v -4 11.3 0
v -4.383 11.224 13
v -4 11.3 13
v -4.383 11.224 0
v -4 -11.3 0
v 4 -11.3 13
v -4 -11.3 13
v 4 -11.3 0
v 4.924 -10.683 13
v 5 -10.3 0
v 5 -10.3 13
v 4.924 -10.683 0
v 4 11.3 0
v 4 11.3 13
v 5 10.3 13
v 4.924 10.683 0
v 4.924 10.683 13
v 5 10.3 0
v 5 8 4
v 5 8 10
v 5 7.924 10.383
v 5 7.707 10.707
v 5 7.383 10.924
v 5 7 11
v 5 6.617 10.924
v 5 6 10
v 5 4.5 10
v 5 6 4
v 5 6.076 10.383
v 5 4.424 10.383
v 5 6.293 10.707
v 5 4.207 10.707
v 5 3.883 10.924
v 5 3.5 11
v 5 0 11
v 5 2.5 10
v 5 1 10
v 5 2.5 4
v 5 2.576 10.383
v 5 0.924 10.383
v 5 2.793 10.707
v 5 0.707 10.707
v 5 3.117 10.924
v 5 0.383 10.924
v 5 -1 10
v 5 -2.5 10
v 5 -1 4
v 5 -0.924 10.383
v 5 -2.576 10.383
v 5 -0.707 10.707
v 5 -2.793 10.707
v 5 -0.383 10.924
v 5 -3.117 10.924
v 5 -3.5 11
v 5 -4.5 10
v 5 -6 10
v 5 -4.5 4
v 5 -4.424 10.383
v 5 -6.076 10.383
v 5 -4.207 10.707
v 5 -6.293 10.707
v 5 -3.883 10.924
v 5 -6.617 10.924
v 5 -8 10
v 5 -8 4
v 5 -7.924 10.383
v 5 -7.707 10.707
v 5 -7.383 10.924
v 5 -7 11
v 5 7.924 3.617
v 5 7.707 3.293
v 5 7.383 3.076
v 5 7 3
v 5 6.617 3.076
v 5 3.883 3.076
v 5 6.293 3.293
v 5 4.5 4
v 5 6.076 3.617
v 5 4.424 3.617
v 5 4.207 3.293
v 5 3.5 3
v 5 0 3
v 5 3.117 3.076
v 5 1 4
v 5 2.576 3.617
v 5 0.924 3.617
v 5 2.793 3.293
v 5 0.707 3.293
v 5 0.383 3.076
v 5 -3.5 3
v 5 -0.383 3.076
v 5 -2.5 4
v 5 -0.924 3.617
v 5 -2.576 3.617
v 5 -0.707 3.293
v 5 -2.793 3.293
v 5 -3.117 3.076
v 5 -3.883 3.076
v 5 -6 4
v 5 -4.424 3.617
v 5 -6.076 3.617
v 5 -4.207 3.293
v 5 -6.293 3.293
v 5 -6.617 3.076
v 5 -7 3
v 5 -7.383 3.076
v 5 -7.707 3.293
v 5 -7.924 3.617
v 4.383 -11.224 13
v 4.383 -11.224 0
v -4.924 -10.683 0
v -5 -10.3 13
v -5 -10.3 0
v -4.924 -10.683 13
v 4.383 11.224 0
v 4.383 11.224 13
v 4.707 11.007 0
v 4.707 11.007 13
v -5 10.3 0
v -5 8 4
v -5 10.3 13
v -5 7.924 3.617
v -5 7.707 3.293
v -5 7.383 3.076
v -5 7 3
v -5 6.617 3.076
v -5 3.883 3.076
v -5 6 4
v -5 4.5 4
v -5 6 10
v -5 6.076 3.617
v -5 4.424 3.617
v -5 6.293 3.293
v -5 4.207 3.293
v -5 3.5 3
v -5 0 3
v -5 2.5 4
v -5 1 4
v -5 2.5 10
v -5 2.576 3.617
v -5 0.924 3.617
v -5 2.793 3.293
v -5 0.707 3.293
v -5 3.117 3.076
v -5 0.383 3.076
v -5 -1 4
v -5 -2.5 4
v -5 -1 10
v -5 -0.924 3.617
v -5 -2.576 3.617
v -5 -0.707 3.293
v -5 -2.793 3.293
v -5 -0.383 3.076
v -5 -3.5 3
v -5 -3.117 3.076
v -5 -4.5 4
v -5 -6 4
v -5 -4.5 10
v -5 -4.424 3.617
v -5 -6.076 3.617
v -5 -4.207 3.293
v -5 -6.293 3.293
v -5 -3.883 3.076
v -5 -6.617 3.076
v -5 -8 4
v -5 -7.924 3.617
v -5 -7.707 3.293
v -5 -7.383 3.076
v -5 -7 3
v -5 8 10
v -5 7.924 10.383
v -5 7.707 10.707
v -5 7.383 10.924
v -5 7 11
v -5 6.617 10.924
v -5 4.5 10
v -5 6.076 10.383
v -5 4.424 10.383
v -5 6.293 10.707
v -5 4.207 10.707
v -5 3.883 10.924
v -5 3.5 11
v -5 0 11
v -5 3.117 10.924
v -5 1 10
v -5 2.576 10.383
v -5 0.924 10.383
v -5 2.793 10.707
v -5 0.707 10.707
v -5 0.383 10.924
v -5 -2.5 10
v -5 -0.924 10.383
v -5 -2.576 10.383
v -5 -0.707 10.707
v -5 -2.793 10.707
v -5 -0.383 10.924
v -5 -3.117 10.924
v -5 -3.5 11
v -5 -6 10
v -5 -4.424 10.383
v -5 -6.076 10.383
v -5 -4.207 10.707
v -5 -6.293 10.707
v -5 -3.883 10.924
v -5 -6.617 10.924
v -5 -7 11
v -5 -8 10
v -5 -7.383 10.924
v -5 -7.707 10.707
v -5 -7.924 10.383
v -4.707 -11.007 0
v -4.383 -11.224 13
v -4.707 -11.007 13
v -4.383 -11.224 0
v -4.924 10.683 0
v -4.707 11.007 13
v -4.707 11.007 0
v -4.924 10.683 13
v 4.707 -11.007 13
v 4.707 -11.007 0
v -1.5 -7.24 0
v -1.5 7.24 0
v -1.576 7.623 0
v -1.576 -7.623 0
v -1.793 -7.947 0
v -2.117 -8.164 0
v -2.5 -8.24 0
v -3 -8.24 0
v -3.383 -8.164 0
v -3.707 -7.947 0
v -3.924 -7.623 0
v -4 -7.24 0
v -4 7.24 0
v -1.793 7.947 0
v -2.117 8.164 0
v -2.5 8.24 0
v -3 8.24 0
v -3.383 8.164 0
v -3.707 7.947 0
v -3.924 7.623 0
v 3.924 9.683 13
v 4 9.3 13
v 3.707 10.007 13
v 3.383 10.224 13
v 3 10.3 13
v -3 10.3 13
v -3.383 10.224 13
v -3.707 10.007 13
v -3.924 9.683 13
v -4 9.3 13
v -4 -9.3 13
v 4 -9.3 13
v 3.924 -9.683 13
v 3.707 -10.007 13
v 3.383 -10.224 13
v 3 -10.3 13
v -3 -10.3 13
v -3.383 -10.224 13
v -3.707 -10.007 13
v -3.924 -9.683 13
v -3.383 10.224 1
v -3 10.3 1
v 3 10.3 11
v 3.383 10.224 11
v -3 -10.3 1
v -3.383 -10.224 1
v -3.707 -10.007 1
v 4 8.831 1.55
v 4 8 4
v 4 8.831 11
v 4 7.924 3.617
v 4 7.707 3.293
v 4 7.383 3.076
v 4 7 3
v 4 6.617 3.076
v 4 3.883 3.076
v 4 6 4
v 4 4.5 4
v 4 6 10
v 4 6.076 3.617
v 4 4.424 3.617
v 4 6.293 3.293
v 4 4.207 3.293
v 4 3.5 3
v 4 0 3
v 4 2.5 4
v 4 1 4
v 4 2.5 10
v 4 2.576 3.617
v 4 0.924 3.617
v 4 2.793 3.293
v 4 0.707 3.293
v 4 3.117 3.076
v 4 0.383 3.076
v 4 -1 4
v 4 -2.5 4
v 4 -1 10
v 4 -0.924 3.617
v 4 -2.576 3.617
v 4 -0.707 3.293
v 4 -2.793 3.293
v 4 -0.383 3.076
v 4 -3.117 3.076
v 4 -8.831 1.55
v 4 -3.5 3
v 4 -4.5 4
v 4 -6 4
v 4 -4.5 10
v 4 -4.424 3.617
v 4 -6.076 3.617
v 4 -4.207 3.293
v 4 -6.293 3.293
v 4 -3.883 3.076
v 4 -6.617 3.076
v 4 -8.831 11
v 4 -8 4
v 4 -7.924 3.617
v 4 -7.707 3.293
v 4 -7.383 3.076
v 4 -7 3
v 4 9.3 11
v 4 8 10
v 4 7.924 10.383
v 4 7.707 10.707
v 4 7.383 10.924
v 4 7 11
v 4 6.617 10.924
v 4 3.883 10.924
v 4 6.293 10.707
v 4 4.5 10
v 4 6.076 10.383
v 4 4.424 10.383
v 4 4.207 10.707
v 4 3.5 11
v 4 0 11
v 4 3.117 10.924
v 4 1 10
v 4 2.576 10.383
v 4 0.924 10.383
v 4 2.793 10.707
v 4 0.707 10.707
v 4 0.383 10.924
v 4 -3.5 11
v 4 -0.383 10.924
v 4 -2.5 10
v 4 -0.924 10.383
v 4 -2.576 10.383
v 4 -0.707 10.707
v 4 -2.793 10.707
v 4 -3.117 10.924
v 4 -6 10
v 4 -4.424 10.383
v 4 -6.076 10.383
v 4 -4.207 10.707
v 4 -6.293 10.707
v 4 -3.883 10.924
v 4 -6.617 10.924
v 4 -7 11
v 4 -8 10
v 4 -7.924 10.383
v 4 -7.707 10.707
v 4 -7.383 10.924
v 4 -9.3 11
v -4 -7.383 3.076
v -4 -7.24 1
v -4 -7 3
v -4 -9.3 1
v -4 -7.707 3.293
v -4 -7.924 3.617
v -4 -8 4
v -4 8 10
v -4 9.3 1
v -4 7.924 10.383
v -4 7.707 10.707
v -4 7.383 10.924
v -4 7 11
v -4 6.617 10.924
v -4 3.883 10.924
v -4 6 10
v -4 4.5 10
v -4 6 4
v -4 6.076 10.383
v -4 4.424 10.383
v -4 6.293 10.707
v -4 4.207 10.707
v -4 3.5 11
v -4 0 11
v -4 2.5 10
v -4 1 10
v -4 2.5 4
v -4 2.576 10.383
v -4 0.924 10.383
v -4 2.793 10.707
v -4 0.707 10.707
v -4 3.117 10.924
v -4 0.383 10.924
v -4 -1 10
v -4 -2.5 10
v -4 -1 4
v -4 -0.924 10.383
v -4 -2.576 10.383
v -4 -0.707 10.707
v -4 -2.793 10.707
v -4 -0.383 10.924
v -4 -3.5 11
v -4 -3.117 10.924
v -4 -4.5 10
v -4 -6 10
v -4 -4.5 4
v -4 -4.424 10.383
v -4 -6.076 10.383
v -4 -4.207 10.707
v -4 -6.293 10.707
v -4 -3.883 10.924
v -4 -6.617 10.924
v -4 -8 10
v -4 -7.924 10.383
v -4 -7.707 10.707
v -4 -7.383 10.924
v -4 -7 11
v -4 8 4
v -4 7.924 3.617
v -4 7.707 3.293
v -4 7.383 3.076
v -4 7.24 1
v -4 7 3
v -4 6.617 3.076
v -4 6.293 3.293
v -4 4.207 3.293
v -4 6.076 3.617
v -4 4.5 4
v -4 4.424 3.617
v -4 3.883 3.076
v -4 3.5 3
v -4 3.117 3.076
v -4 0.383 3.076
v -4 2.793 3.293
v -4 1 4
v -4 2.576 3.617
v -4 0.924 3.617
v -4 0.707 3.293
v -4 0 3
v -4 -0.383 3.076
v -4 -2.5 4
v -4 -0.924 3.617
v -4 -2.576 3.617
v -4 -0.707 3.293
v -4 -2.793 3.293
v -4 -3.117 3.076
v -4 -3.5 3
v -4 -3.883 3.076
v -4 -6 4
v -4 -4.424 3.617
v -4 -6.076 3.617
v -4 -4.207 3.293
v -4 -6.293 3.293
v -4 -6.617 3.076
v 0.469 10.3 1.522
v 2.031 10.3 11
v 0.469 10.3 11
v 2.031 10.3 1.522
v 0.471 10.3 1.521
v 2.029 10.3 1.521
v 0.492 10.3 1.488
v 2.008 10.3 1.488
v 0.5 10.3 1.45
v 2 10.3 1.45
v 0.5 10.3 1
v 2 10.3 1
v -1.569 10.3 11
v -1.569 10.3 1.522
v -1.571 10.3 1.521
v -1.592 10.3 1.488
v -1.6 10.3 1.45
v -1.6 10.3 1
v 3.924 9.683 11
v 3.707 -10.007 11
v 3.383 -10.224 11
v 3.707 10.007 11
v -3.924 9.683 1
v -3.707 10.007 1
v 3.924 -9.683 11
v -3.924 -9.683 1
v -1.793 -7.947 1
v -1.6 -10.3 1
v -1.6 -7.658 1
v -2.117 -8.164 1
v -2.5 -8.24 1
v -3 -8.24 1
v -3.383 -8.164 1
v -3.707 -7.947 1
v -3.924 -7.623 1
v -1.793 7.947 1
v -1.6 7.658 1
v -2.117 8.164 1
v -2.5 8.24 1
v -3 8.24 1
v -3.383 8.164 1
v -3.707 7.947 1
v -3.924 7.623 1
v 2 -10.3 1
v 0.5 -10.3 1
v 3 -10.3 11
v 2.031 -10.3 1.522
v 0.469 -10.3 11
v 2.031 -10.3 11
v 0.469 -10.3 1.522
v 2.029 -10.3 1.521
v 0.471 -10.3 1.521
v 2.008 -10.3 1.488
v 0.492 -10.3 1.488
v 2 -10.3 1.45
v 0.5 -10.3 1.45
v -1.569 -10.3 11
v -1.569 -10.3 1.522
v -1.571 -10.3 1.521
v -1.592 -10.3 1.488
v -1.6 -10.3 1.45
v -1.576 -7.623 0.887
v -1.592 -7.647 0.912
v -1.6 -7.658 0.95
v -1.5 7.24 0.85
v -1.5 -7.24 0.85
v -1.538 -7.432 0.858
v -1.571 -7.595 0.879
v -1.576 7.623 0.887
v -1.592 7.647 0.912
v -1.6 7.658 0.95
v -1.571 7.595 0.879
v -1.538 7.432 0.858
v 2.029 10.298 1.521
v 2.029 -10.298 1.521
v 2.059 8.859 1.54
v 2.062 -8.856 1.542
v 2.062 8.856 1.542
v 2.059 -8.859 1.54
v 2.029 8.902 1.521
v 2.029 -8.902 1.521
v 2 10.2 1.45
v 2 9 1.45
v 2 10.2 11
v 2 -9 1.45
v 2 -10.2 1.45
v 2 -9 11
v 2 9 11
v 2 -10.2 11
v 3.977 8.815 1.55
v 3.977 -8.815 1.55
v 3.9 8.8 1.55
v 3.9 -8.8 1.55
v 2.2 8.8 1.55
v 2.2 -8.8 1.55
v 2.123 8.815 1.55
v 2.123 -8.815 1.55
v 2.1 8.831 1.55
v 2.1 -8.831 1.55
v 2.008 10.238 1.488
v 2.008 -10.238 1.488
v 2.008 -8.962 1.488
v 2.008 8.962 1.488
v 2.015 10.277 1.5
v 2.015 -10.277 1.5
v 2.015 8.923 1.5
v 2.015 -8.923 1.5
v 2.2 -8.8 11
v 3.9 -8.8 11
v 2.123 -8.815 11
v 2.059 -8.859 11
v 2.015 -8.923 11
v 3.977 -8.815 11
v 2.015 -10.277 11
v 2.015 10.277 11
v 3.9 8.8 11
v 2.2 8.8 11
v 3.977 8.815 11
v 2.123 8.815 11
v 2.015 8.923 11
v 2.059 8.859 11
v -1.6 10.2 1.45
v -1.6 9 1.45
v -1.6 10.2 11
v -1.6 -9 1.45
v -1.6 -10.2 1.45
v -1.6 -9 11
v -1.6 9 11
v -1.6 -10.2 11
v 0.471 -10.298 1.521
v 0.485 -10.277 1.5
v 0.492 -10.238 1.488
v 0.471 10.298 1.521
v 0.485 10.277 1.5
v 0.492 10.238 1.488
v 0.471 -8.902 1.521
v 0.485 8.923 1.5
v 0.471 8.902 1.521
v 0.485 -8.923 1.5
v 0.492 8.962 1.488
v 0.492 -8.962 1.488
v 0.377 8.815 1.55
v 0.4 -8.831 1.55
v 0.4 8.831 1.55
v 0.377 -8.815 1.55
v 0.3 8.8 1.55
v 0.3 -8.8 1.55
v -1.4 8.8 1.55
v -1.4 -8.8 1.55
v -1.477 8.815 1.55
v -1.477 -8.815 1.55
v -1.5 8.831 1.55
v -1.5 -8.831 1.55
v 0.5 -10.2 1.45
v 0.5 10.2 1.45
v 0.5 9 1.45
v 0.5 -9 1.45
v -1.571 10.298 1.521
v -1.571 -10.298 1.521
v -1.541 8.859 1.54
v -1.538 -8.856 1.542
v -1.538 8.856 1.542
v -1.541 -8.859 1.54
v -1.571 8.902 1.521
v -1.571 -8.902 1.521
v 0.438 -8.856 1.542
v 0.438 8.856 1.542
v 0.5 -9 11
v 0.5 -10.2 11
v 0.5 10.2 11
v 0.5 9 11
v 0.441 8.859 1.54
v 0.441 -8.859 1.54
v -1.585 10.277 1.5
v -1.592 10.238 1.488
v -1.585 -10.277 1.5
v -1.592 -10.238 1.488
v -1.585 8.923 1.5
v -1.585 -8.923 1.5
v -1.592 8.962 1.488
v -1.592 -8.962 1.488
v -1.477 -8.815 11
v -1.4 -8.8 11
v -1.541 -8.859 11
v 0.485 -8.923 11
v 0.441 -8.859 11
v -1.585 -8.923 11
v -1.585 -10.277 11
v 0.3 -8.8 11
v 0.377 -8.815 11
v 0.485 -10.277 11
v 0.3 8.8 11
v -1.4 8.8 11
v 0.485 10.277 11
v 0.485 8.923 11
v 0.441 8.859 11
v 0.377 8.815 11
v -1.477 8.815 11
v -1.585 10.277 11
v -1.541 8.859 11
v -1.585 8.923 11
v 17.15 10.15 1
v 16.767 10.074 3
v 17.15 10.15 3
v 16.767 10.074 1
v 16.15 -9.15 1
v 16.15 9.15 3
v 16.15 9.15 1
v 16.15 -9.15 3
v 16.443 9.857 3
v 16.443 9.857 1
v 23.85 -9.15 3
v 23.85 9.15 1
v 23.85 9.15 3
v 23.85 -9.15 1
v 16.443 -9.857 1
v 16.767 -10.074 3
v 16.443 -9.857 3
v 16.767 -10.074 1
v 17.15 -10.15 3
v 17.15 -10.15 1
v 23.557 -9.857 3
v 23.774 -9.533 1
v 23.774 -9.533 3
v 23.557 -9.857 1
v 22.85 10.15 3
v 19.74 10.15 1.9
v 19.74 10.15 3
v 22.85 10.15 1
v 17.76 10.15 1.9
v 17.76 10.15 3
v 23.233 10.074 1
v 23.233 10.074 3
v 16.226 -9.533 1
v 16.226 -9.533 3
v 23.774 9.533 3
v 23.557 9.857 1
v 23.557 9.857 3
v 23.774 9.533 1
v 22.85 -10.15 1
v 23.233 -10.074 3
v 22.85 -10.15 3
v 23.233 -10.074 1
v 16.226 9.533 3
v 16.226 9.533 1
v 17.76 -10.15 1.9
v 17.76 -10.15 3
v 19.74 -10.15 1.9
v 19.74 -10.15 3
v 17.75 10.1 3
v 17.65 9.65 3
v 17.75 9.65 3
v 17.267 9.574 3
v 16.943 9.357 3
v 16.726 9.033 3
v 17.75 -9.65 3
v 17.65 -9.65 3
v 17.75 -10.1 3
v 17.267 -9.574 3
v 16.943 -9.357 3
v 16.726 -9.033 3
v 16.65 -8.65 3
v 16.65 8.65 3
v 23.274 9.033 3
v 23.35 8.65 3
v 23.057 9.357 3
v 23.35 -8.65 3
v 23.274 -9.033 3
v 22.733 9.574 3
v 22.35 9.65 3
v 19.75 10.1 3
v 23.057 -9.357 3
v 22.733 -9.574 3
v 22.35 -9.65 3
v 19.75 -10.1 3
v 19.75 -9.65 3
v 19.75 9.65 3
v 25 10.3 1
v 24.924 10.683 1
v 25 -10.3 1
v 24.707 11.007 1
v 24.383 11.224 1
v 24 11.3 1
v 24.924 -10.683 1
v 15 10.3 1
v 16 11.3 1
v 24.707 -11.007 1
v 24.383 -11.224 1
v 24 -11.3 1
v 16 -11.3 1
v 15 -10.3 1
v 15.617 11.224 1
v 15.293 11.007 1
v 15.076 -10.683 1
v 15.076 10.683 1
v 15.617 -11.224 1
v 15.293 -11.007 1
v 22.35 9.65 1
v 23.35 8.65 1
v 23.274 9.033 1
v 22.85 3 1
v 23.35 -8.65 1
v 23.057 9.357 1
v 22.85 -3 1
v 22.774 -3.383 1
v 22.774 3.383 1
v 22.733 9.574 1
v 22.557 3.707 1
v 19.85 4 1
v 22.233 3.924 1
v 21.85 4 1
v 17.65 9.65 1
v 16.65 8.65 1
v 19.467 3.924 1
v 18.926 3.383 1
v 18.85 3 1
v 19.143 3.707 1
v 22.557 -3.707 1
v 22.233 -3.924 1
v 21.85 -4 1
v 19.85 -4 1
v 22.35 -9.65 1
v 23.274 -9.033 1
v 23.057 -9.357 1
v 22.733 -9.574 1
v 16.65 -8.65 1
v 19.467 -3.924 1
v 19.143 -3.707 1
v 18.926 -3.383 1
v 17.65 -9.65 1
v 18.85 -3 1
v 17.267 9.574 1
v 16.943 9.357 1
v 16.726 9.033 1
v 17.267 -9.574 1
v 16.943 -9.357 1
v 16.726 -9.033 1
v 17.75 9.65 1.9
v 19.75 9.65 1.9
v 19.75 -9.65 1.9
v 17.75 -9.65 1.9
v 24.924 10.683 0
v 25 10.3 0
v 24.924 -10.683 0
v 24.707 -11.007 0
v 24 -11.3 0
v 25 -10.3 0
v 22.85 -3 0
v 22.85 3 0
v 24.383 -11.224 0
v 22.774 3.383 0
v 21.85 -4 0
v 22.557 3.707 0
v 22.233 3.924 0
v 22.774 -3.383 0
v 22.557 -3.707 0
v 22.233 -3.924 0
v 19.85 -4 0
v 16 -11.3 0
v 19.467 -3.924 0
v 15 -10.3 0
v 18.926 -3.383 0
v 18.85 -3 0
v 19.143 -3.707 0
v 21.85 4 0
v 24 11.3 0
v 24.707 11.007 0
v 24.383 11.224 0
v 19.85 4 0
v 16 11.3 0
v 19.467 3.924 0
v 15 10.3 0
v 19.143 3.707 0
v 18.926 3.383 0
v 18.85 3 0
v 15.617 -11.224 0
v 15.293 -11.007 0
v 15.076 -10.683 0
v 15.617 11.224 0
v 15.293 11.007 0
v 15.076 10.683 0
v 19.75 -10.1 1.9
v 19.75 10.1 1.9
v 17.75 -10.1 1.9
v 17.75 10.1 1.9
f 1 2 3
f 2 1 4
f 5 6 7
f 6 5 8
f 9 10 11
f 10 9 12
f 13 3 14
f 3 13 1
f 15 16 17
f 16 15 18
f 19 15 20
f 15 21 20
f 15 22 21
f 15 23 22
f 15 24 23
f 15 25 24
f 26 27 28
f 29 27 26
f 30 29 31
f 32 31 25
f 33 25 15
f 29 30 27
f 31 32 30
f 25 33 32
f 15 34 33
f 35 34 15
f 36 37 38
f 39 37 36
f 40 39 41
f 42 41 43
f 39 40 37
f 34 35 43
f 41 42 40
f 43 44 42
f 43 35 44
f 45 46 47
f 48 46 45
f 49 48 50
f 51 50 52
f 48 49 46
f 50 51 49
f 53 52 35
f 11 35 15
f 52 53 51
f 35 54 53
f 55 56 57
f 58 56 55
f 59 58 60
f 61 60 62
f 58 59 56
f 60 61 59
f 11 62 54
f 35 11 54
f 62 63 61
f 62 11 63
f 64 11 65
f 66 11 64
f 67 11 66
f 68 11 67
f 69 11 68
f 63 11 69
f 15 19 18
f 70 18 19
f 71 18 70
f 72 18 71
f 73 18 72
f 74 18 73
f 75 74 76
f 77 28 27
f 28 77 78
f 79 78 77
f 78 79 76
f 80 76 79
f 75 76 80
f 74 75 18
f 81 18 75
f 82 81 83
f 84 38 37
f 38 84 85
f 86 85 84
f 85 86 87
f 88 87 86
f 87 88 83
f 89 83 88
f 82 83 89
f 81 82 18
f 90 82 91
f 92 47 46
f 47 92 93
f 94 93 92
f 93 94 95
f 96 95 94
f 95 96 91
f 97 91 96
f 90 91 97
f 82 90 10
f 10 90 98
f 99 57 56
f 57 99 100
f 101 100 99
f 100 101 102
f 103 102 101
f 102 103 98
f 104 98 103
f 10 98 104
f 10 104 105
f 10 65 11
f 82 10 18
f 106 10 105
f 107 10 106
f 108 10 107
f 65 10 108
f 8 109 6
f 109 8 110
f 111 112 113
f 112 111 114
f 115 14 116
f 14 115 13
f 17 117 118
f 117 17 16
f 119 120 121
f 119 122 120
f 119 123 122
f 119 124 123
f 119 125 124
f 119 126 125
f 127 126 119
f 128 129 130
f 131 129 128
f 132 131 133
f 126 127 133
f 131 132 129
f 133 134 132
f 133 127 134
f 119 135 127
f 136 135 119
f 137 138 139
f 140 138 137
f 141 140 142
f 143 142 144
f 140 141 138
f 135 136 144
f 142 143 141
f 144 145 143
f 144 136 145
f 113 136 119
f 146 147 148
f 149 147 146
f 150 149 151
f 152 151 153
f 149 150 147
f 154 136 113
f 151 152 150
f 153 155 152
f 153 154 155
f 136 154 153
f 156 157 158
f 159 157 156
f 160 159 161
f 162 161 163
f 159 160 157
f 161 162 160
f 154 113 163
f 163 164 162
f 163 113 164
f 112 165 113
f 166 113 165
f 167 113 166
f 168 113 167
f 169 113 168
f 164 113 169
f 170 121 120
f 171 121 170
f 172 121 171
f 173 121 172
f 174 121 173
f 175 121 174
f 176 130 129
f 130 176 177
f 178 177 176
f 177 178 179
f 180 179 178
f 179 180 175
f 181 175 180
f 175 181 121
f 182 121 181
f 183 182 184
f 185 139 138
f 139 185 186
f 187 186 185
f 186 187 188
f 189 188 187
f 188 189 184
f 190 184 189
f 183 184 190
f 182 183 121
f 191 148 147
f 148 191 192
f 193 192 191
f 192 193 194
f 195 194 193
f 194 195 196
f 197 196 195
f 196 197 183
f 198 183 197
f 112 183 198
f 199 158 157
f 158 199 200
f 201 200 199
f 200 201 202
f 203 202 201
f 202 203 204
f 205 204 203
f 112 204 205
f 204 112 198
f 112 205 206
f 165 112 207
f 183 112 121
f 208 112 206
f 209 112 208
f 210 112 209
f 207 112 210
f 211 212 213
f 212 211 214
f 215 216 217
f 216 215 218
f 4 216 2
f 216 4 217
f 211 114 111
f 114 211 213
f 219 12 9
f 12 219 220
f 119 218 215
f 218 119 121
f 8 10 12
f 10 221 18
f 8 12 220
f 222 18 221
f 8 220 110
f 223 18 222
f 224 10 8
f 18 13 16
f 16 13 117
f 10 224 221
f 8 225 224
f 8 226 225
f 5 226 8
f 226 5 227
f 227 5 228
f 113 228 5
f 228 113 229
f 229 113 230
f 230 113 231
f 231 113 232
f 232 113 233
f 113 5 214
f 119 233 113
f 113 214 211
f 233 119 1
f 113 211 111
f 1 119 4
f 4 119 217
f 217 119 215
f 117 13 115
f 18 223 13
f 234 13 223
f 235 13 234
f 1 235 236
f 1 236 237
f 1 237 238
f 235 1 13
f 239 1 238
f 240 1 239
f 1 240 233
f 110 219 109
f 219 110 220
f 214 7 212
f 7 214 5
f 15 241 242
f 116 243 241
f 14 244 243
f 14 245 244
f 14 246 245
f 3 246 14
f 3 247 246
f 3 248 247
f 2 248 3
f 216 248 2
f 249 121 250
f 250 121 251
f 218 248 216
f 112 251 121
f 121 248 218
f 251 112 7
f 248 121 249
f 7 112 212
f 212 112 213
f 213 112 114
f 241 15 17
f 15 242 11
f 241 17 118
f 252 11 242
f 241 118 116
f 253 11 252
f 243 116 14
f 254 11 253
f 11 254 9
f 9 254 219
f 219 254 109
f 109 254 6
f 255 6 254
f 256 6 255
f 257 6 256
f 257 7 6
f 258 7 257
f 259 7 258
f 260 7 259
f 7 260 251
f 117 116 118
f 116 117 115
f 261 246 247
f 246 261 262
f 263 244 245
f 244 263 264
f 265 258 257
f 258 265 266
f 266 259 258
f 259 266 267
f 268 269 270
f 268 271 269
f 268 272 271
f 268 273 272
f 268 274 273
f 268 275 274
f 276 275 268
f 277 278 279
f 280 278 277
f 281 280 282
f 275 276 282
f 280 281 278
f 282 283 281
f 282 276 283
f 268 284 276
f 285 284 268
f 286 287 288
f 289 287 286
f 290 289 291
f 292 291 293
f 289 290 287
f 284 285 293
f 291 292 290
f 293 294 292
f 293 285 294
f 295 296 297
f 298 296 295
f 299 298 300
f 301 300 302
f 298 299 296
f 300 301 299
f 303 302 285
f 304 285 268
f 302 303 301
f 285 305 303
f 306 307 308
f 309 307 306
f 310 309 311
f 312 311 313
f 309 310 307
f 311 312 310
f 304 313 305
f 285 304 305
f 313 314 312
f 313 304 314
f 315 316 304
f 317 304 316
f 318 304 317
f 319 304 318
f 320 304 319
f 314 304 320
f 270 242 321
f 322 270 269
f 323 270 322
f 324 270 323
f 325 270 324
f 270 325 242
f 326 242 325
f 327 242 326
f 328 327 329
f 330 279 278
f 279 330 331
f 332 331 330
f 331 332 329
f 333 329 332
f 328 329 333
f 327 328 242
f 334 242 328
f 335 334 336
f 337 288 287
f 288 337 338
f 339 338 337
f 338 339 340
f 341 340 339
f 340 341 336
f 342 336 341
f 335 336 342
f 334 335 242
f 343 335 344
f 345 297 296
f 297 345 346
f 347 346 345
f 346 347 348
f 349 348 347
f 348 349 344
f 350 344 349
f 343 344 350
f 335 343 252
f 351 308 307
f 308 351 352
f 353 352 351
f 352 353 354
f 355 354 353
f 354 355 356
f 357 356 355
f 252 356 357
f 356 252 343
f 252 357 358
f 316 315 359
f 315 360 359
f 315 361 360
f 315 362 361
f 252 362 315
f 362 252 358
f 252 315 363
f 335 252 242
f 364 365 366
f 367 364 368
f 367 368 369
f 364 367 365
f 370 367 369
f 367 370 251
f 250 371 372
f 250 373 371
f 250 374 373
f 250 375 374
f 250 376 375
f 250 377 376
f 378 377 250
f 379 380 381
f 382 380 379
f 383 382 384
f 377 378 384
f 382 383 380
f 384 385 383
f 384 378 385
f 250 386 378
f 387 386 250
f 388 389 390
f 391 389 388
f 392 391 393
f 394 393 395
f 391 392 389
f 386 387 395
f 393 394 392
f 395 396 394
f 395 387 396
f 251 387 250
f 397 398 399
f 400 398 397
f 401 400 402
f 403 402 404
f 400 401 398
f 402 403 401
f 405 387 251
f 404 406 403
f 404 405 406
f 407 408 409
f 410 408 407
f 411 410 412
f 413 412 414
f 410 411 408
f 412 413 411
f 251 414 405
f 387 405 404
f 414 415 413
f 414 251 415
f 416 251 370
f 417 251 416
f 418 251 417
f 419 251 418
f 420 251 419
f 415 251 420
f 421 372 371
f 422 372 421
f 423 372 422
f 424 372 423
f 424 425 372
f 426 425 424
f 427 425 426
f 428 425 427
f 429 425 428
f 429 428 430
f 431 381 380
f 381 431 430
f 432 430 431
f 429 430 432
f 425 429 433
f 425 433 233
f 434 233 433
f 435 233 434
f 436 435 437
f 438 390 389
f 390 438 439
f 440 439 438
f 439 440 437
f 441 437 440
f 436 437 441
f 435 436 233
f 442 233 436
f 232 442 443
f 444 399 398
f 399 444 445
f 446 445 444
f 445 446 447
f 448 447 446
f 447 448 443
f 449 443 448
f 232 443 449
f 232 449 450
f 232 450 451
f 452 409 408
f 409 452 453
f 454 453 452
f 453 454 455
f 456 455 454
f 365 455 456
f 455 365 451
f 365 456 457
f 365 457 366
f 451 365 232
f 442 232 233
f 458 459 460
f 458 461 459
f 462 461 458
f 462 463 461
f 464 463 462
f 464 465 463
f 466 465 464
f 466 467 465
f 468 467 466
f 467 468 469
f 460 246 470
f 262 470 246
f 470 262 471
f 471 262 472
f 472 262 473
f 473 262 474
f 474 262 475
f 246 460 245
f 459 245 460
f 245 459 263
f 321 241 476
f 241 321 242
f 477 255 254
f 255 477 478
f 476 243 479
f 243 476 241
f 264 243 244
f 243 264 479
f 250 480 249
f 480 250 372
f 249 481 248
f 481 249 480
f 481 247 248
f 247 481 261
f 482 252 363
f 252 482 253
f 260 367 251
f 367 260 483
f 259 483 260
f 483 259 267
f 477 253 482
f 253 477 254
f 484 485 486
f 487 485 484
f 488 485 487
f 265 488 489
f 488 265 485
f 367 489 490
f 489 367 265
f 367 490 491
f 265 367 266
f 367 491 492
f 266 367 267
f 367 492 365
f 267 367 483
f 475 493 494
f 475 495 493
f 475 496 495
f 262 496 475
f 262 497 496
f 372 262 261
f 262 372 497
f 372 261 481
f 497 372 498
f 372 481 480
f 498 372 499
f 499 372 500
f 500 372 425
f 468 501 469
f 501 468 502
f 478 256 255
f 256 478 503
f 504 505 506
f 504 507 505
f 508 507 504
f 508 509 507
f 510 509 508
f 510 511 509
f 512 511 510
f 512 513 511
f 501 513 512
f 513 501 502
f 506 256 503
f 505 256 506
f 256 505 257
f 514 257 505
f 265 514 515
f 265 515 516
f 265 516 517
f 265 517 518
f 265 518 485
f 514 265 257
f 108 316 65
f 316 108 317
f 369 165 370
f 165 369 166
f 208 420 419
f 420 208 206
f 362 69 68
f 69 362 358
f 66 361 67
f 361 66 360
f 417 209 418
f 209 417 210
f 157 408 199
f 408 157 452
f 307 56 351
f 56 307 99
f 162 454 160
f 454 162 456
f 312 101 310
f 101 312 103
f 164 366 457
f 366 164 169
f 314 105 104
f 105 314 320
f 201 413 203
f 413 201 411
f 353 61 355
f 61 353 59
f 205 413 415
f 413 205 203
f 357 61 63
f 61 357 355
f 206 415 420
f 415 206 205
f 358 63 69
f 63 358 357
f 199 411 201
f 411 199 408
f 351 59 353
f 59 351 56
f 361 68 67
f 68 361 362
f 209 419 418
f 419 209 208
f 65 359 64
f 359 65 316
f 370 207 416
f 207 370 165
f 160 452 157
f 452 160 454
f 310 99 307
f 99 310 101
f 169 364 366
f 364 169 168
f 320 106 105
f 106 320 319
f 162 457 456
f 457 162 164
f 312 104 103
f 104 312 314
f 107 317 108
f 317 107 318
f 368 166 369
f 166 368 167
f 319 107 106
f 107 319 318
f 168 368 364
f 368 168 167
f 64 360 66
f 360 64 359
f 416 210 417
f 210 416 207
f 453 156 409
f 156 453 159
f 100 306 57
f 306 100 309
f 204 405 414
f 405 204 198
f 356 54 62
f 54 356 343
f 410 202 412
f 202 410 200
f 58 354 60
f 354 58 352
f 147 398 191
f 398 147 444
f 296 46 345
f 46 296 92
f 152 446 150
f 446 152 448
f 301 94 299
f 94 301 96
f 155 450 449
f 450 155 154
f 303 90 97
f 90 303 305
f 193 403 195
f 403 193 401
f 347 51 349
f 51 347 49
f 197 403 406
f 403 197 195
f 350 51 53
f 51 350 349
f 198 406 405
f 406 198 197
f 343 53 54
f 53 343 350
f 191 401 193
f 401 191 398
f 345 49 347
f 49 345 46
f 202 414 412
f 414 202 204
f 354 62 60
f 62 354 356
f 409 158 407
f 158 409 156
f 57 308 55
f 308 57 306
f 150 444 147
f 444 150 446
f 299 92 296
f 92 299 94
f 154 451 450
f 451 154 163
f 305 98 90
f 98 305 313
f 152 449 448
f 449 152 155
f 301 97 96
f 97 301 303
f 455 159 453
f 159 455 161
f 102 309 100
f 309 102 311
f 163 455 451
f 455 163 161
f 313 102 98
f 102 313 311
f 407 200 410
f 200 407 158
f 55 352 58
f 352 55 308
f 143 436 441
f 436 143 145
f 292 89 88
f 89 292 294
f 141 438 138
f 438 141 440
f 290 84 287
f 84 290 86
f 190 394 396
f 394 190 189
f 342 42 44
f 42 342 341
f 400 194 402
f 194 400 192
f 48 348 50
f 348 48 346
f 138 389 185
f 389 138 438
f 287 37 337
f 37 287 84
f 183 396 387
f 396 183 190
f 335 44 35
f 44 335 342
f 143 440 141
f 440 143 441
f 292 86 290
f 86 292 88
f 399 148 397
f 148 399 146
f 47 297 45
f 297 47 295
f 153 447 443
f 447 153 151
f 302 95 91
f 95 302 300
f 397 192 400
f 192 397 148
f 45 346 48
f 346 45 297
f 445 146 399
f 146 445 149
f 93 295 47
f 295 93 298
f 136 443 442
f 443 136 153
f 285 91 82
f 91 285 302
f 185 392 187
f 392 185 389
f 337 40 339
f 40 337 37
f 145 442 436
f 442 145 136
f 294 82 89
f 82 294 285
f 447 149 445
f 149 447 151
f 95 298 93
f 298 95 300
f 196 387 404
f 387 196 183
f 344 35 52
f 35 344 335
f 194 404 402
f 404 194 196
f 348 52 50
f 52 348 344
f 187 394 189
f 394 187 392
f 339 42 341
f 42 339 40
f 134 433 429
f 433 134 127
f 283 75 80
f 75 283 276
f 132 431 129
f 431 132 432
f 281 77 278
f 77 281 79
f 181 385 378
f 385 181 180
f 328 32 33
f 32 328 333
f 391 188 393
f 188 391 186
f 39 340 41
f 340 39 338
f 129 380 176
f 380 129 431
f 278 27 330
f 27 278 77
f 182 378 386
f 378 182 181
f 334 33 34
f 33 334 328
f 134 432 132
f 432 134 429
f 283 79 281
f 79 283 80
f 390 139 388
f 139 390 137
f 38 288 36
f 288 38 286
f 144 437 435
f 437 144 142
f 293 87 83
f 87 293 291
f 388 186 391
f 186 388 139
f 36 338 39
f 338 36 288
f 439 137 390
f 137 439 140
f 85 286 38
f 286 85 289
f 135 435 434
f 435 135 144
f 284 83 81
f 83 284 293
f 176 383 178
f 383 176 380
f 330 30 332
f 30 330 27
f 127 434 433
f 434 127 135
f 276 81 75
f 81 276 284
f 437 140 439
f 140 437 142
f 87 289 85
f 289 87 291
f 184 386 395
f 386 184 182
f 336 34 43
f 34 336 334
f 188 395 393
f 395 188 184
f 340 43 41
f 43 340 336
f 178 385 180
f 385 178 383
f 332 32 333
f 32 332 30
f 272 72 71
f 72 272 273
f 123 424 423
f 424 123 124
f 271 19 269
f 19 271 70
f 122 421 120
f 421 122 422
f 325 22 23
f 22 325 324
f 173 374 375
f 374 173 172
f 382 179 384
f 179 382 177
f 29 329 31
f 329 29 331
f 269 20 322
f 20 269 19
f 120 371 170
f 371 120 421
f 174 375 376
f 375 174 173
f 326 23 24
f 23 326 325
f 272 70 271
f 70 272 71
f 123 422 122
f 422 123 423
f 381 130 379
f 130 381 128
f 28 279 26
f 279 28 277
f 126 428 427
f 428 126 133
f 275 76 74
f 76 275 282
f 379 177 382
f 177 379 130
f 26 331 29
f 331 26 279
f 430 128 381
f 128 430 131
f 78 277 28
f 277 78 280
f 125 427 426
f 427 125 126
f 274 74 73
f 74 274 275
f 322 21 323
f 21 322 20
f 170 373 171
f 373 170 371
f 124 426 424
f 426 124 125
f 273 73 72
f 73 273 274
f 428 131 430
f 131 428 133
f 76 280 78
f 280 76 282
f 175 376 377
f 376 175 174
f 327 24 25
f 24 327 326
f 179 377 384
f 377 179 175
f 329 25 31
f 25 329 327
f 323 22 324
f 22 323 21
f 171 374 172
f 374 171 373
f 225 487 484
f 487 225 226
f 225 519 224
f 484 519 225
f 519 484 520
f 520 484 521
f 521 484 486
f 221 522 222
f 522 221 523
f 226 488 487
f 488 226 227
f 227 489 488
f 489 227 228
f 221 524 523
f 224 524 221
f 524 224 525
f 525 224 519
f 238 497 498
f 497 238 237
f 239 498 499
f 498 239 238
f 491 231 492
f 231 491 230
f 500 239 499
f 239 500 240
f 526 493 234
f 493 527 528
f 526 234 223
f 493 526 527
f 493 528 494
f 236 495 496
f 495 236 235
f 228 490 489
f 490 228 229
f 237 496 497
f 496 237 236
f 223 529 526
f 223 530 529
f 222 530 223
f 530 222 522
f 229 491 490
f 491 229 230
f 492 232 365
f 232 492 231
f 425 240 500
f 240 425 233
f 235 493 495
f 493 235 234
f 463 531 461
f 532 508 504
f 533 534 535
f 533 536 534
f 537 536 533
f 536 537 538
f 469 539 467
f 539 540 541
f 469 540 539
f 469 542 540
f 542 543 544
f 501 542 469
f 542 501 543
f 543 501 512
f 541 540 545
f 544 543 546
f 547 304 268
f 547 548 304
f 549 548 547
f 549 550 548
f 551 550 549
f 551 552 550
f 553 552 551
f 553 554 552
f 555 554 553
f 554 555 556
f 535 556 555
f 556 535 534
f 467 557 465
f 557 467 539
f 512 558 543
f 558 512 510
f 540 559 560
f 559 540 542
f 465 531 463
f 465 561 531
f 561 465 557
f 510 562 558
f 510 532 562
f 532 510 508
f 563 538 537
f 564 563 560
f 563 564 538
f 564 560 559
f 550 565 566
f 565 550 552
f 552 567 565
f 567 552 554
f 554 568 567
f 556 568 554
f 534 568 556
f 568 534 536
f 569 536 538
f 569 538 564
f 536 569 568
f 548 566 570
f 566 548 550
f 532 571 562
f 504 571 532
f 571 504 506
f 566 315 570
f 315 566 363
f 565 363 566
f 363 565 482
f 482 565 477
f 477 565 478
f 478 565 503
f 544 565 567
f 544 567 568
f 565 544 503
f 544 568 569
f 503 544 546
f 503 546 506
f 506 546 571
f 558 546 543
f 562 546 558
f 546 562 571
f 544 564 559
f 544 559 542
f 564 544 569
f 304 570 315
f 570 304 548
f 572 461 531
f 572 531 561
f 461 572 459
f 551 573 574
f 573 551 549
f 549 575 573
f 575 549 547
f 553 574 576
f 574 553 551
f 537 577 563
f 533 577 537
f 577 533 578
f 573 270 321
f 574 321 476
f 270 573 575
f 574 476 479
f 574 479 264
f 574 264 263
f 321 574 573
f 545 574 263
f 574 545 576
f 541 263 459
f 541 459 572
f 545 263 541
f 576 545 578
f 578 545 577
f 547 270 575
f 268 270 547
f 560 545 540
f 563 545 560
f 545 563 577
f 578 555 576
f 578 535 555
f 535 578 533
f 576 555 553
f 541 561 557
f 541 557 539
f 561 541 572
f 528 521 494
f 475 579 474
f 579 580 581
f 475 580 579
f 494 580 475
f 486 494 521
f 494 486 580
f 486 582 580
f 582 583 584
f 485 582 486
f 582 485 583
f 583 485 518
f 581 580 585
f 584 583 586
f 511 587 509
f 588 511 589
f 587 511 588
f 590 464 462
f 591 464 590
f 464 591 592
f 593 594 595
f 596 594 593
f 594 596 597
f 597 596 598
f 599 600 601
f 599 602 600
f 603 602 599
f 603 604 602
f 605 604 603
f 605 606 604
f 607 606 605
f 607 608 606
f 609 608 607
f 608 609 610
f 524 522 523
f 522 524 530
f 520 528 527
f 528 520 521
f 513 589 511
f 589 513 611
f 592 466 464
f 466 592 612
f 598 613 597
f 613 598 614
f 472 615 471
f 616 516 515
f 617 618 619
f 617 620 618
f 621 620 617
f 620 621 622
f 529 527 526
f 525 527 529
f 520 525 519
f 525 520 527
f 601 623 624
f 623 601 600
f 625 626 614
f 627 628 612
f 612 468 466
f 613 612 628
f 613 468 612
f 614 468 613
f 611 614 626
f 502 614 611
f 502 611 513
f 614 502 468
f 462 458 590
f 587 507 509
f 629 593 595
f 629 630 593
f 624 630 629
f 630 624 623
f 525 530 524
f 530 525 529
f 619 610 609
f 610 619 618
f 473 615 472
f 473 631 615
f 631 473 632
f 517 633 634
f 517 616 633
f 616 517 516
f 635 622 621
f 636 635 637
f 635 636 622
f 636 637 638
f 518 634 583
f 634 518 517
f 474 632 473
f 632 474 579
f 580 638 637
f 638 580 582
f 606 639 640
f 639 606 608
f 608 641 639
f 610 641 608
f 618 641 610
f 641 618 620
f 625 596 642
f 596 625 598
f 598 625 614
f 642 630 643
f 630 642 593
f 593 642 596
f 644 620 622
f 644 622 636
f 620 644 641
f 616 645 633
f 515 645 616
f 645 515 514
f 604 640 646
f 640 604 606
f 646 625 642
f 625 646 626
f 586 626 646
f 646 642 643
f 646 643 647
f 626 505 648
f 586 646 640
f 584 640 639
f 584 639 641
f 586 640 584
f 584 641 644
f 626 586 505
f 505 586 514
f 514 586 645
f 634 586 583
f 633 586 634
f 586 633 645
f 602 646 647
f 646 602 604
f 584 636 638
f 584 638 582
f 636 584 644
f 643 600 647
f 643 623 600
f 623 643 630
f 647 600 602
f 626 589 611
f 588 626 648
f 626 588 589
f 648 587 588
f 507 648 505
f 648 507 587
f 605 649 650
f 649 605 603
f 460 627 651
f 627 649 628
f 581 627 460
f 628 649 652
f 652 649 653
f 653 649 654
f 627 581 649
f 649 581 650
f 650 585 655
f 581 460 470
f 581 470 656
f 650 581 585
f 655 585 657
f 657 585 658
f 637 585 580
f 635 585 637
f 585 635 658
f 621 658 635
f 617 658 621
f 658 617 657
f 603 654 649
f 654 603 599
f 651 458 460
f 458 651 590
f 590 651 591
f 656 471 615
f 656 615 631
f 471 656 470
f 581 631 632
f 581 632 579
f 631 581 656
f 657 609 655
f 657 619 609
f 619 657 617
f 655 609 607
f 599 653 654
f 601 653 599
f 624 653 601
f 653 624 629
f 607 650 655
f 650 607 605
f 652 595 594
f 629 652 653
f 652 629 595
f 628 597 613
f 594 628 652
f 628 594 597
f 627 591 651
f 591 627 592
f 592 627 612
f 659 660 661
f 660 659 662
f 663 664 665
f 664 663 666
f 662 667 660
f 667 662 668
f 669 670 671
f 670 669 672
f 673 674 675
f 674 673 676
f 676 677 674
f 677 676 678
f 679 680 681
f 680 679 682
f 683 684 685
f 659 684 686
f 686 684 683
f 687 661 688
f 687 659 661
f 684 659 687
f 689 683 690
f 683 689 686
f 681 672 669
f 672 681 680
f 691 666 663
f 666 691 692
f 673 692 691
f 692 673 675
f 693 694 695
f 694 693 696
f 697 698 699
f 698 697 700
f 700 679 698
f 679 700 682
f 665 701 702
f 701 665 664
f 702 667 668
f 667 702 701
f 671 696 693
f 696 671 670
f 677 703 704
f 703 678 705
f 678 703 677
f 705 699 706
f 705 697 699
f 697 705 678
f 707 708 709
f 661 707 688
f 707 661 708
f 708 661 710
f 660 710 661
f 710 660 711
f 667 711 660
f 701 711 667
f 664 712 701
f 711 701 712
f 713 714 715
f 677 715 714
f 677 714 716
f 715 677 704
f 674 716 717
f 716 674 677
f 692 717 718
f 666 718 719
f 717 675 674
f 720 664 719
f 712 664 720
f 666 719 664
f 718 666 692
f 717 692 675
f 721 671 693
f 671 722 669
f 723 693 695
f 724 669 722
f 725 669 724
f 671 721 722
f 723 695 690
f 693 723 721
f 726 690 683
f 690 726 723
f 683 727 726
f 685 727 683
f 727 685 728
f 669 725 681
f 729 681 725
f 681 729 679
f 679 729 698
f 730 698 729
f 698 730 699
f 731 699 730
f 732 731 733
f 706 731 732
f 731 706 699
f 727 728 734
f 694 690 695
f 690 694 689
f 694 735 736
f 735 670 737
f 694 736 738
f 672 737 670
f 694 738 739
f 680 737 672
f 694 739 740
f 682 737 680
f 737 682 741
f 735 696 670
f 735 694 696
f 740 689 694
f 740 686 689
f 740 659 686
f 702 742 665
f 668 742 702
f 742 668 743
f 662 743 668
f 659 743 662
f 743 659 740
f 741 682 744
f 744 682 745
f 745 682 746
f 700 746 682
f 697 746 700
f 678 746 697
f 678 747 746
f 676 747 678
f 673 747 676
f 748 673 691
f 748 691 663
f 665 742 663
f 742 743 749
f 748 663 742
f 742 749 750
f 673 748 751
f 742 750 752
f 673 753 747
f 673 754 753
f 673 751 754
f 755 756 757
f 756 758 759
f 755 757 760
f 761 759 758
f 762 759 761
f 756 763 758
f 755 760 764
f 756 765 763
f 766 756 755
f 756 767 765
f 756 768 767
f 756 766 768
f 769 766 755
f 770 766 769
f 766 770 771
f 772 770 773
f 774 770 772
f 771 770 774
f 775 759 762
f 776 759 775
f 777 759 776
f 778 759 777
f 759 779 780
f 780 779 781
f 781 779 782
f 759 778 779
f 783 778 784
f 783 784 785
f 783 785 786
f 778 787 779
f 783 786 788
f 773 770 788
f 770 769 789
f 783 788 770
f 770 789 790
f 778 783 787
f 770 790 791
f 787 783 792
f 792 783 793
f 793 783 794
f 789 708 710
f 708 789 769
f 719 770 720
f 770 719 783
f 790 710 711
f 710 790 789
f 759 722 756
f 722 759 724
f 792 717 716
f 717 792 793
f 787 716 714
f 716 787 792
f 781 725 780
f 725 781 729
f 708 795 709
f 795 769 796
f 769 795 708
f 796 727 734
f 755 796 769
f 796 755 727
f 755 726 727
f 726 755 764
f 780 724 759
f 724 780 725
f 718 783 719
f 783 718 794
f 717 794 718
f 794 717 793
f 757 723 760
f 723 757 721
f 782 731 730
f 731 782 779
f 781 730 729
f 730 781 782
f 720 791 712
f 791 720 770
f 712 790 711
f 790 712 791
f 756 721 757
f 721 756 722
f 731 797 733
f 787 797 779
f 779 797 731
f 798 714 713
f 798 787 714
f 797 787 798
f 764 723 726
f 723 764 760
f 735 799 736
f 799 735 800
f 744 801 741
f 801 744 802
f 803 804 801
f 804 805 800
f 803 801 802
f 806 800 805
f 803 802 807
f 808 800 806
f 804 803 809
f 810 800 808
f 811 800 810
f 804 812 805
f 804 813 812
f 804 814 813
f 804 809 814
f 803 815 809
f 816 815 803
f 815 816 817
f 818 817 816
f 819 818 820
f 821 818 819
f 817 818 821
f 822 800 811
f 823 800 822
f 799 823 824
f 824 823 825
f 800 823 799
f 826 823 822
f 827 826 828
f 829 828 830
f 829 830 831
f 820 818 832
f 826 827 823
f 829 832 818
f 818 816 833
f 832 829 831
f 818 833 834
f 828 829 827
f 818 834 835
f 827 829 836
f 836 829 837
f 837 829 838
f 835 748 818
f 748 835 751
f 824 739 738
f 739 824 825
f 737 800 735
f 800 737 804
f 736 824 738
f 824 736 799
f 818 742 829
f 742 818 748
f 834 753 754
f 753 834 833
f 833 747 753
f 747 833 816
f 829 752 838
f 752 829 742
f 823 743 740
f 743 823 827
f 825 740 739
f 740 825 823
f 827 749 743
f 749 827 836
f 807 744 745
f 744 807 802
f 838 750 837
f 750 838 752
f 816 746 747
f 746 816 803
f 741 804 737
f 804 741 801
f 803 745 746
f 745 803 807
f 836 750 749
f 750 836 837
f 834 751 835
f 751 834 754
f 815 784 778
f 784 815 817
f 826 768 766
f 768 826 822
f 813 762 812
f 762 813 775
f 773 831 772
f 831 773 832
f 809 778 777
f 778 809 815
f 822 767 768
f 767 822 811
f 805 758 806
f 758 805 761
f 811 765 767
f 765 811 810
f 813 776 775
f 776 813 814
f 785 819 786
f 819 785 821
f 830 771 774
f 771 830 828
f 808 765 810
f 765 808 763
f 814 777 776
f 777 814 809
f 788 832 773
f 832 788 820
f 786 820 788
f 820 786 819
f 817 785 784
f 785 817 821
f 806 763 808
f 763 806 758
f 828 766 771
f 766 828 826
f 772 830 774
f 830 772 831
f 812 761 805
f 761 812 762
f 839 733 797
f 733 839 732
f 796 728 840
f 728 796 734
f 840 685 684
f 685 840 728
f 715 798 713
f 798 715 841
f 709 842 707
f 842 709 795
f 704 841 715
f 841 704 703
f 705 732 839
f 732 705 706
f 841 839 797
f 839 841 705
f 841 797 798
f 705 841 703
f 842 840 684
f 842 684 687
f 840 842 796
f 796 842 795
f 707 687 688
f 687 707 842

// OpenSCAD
//
// Adafruit Micro USB Breakout Board Enclosure
//
// by Yasuhiro Wabiko
// This is licensed under the Creative Commons - Attribution license.
//

use <prim.scad>

// inner size of the box.
// typically, (x,y) = board size, z depends on how much space you need for cabling.
//
size_x = 10;
size_y = 20.6; // 20.2 too small
size_z = 8;

// shell dimensions
shell_thick = 1; // thickness
shell_r     = 1; // radius in minkowski transform

// board parameters
board_thick      = 1.5;    // board thickness, typically 2mm
arm_thick        = 1.5;    // arm thickness (overhang)
arm_up_z         = 2;      // arm upper part height (in z-axis)
arm_low_z        = 2;      // arm upper part height (in z-axis)
arm_center_thick = 0.6;
arm_center_up_y  = size_y; // arm (center) upper part width
arm_center_low_y = size_y; // arm (center) lower part width
arm_left_up_x    = size_x; // arm (left) upper part height
arm_left_low_x   = size_x; // arm (left) lower part height
arm_right_up_x   = size_x;      // arm (right) upper part height
arm_right_low_x  = size_x; // arm (right) lower part height
arm_r            = 0.2;    // radius in minkowski transform
arm_z            = arm_low_z + board_thick + arm_up_z;

// lid dimensions
lid_outer_x = 1;
lid_inner_x = 2;

// misc design parameters
spfn_small  = 8;
spfn_medium = 16;
spfn_large  = 64;
lid_inner_thick = 2;

// internal parameters
WELDING = 0.1;
WELDING_SMALL = 0.3;
SHELL_LID_DIST = 10; // distance between shell and lid when print_ready_layout


//
// top level logic
//
microusb(with_vent=1, with_cabling=0, with_shell=1, with_print=1);
//microusb_unit_with_support(sh=36-8.5, with_vent=1, with_cabling=1, with_shell=0);
//rotate([0,90,0])
//microusb_unit_with_support(sh=40-size_x, with_vent=1, with_cabling=1, with_shell=0);


// -------------------------
// Public Modules
// -------------------------

// [Public]
// Minimum size enclosure.
//
// with_vent = { 1: with ventilation slits, 0: without ventilation slits }
// with_lid  = { 1: render the lid, 0: does not render the lid }
// with_cabling = { 1: render a big openings on the enclosure for easier cabling, 0: without such openings }
// with_shell = { 1: render the shell (outermost enclosure that matches the requested dimension). 0: does not render the shell.}
// with_print = { 1: print layout (models are rotated to be printable), 0: edit layout (no rotation) }
// with_open_roof = { 1: make a big opening on the 'roof' part (for debugging), 0: do not do that }
module microusb(with_vent=1, with_lid=1, with_cabling=0, with_shell=1, with_print=0, with_open_roof=0){

    if (with_print) {
        rotate([0,-90,0])
            translate([size_x/2+shell_thick+lid_inner_x/2, 0, 0])
            microusb_body(with_vent=with_vent, with_lid=with_lid, with_cabling=with_cabling, with_shell=with_shell, with_open_roof=with_open_roof);
        if (with_lid) {
            translate([size_z+shell_thick*2+SHELL_LID_DIST,0,0])
                rotate([0,90,0])
                microusb_lid(size_x, size_y, size_z, shell_r, shell_thick,
                             spfn_small, spfn_medium, spfn_large);
        }
    } else {
        // debug
        translate([0, 0, 0]) {
            // debug
            difference() {
                union() {
                    translate([0, 0, 0])
                        microusb_body(with_vent=with_vent, with_lid=with_lid, with_cabling=with_cabling, with_shell=with_shell, with_open_roof=with_open_roof);
                    if (with_lid) {
                        microusb_lid(size_x, size_y, size_z, shell_r, shell_thick,
                                     spfn_small, spfn_medium, spfn_large);
                    }
                }
                // debug
                translate([-size_x/2, size_y/2+shell_thick/2, 0]) {
                    //#cube([size_x*4, shell_thick, arm_z], center=true);
                }
            }
        }
    }
}

// [Public]
// Variable size enclosure(in x-axis only). Typically to be embededd in another project.
// 
// ox, oy, oz = dimension (this has to be equals to or larger than (size_x, size_y, size_z).
// with_vent = { 1: with ventilation slits, 0: without ventilation slits }
// with_lid  = { 1: render the lid, 0: does not render the lid }
// with_cabling = { 1: render a big openings on the enclosure for easier cabling, 0: without such openings }
// with_shell = { 1: render the shell (outermost enclosure that matches the requested dimension). 0: does not render the shell.}
// with_print = { 1: print layout (models are rotated to be printable), 0: edit layout (no rotation) }
// with_open_roof = { 1: make a big opening on the 'roof' part (for debugging), 0: do not do that }
module microusb_unit(ox=0, with_vent=0, with_cabling=0, with_shell=0, with_support=1, with_arm=1, with_open_roof=0) {
    microusb_unit_with_support(ox-size_x, with_vent=with_vent, with_cabling=with_cabling, with_shell=with_shell, with_support=with_support, with_arm=with_arm, with_open_roof=with_open_roof);
}



// [Public]
// Lid
module microusb_unit_lid_only() {
    rotate([0,0,180]) {
        microusb_lid(size_x, size_y, size_z, shell_r, shell_thick,
                     spfn_small, spfn_medium, spfn_large);
    }
    
}

// [Public]
// Negative volume of lid that can be shared with the outer model (useful when you are embedding this model in another project).
module microusb_unit_lid_negative_voume() {
    rotate([0,0,180]) {
        translate([-lid_outer_x, 0, 0]) {
            translate([lid_outer_x/2,0,0]) {// centering to match with positive volume
                #microusb_lid_negative_volume(size_x, size_y, size_z, shell_r, shell_thick,
                                             spfn_small, spfn_medium, spfn_large);
            }
        }
    }
}

// -------------------------
// Private Modules
// -------------------------

module microusb_body(with_vent=0, with_lid=0, with_cabling=0, with_shell=0, with_arm=1, with_open_roof=0){
    dx = (with_cabling)*lid_inner_x;
    union() {
        difference() {
            union() {
                cube([0,0,0]); // dummy cube to make difference() work regardless of conditions
                if (with_shell){
                    microusb_shell(size_x, size_y, size_z, shell_r, shell_thick,
                                   spfn_small, spfn_medium, spfn_large, with_open_roof=with_open_roof);
                }
                // side support. (if with_shell=1, it is embedded inside shell, so invisible.)
                for (i=[-1,1]) {
                    //translate([-size_x/2-shell_thick*2+WELDING_SMALL+arm_left_up_x/2, (-size_y/2-shell_thick+WELDING_SMALL)*i, -board_thick]) {
                    //cube([arm_left_up_x, WELDING_SMALL*2, arm_z], center=true);
                    //}
                }
            }
            union() {
                if (with_shell) {
                    microusb_shell_negative_volume(size_x, size_y, size_z, shell_r, shell_thick,
                                                   spfn_small, spfn_medium, spfn_large, with_vent, with_cabling, with_shell);
                }
            }
        }

        if (with_arm) {
            translate([-shell_thick+dx/2,0,-shell_thick]){
                microusb_shell_arm(size_x, size_y, size_z, shell_r, shell_thick,
                                   spfn_small, spfn_medium, spfn_large);
            }
        }
    }
}


module microusb_unit_with_support(sh=0, with_vent=0, with_cabling=0, with_shell=0, with_support=1, with_arm=1, with_open_roof=0) {
    // for debug
    // translate([size_x+sh-2,-size_y/2,arm_z/2-arm_low_z])
    //translate([0, -size_y/2,-2])
    {
        difference() { // cut unnecessary welding at the top and bottom
            union() {
                if (with_support) {
                    // support structure
                    difference(){
                        translate([-(size_x+sh)/2, 0, 0]) {
                            prim_round_xplate0(size_x+sh, size_y+shell_thick*2, size_z, 0.1, spfn_medium);
                        }
                        translate([-sh-size_x/2-WELDING_SMALL, 0, 0]) {
                            #prim_round_xplate0(size_x+WELDING_SMALL*2, size_y, size_z+WELDING, 0.1, spfn_medium);
                        }
                    }
                }

                translate([-sh-size_x/2,0,0]) {
                    rotate([0,0,180]) {
                        microusb_body(with_vent=with_vent, with_cabling=with_cabling, with_shell=with_shell, with_arm=with_arm, with_open_roof=with_open_roof);
                    }
                }
            }
            union() { // unnecessary parts at the top and bottom
                translate([-(size_x+sh)/2, 0, -arm_z-shell_thick]) {
                    #cube([size_x+sh, size_y+shell_thick*4, arm_z], center=true);
                }
                translate([-(size_x+sh)/2, 0, arm_z-shell_thick]) {
                    #cube([size_x+sh, size_y+shell_thick*4, arm_z], center=true);
                }

            }
        }
    }
}



//
// (sx,sy,sz) = dimension of stuffing
//
// centered at the center of stuffing (excluding lid_inner_x)
//
module microusb_shell(sx, sy, sz, wr, wt,
                      fns, fnm, fnl, with_open_roof=0){

    // requested dimensions
    ox = sx+wt+lid_inner_x;
    oy = sy+wt*2;
    oz = sz+wt*2;
    
    translate([ox/2-sx/2-wt-lid_inner_x/2, oy/2-sy/2-wt, oz/2-sz/2-wt]) {
        difference(){
            // shell outer frame
            translate([0,0,0]){
                prim_round_xplate0(ox, oy, oz, wr, fnm);
            }
            // shell space for stuffing
            translate([wt, 0, 0]) {
                #prim_round_xplate0(sx+lid_inner_x+wt, sy, sz+10*with_open_roof, wr, fnm);
            }
        }
    }

}

module microusb_shell_arm(sx, sy, sz, wr, wt,
                      fns, fnm, fnl){
    // requested dimensions
    ox = sx+wt+lid_inner_x;
    oy = sy+wt*2;
    oz = sz+wt*2;

    with_center = 1;
    with_right = 1;
    with_left = 1;
    
    for (i=[0,1]){ // i = { 0:arm lower, 1:arm upper }
        dz = (arm_low_z/2+board_thick+arm_up_z/2+WELDING)*i;
        rx = [arm_right_low_x, arm_right_up_x][i];
        lx = [arm_left_low_x, arm_left_up_x][i];
        cy = [arm_center_low_y, arm_center_up_y][i];
        echo (rx=rx);
        translate([-wt, 0, -sz/2+wt+arm_low_z/2-WELDING/2+dz]){

            // center
            if (with_center) {
                y0 = -size_y/2+cy/2;
                translate([-sx/2+arm_center_thick/2-WELDING+wt, y0, 0]) {
                    prim_round_yplate0(arm_center_thick+WELDING, arm_center_low_y+WELDING*2, arm_low_z+WELDING, 0.1, fnm);
                }
            }

            // left
            if (with_left) {
                x0 = -size_x/2+lx/2+wt;
                translate([x0-WELDING/2, -sy/2+arm_thick/2-WELDING/2, 0]) {
                    prim_round_xplate0(lx+WELDING, arm_thick+WELDING, arm_low_z+WELDING, arm_r, fnm);
                }
            }

            // right
            if (with_right) {
                x0 = -size_x/2+rx/2+wt;
                translate([x0-WELDING/2, sy/2-arm_thick/2+WELDING/2, 0]) {
                    prim_round_xplate0(rx+WELDING, arm_thick+WELDING, arm_low_z+WELDING, arm_r, fnm);
                }
            }
        }
    }
}

module microusb_shell_negative_volume(sx, sy, sz, wr, wt,
                                      fns, fnm, fnl, with_vent=0, with_cabling=0, with_shell=0){
    // cable hole at the top of shell
    if (with_cabling) {
        translate([0, 0, sz/2])
            prim_round_zplate0(sx*2, sy*2, sz*0.5, 1, fnm);
    }

    // cable hole at the bottom of shell
    if (with_cabling) {
        for (i=[-2:1:2]) {
            translate([0, i*2.54, 0])
                prim_round_zplate0(sx*0.9, 2.0, sz+wt*2+WELDING, 1, fnm);
        }
    }

    if (with_vent){
        // top/bottom vent
        for (i=[-2:1:2]) {
            translate([0, i*3.5, 0])
                #prim_round_zplate0(sx*0.8, 2, sz+wt+2, 1, fnm);
                }

        // side vent
//        for (i=[0.5]) {
//            translate([0, 0, i*4])
//                #prim_round_yplate0(sx*0.8, sy+wt+2, 2, 1, fnm);
//        }

        // front vent
        vz = sz-arm_z;
        for (i=[0.5]) {
            translate([0, 0, -sz/2+arm_z+vz/2])
                #prim_round_xplate0(sx+wt*2+2, sy*0.8, vz, 1, fnm);
        }
    }
    
    // front
    if (with_shell) {
        translate([-sx/2-wt, 0, -sz/2+arm_low_z+board_thick/2]) {
            //prim_round_xplate0(wt*2+4, 16, board_thick, 0.1, fnm);
        }
    }
}


module microusb_lid(sx, sy, sz, wr, wt,
                      fns, fnm, fnl){
    translate([-lid_outer_x, 0, 0])
    difference(){
        microusb_lid_body(sx, sy, sz, wr, wt,
                          fns, fnm, fnl);
        union() {
            translate([lid_outer_x/2,0,0]) { // centering to match with positive volume
                microusb_lid_negative_volume(sx, sy, sz, wr, wt,
                                             fns, fnm, fnl);
                microusb_lid_negative_volume_private(sx, sy, sz, wr, wt,
                                                     fns, fnm, fnl);
            }
        }
    }
}

module microusb_lid_body(sx, sy, sz, wr, wt,
                      fns, fnm, fnl){

    // inner
    translate([-lid_inner_x/2,0,0])
    difference(){
        prim_round_xplate(lid_inner_x, sy-WELDING_SMALL, sz-WELDING_SMALL, wr, fnm);
        translate([0, 0, 0])
            prim_round_xplate(lid_inner_x+WELDING*2, sy-wt-WELDING_SMALL, sz-wt-WELDING_SMALL, wr, fnm);
    }    

    // outer
    translate([lid_outer_x/2,0,0])
        prim_round_xplate(lid_outer_x, sy+wt*2, sz+wt*2, wr, fnm);

}

// shared with lid outer
module microusb_lid_negative_volume(sx, sy, sz, wr, wt,
                                    fns, fnm, fnl){
    // microusb in 
    translate([0,0,0.85]) {
        #prim_round_xplate(lid_outer_x+WELDING*2, 8, 4, wr, fnm);
    }
}

// with lid inner
module microusb_lid_negative_volume_private(sx, sy, sz, wr, wt,
                                    fns, fnm, fnl){

    // slit to accomodate board edge
    translate([-lid_outer_x-lid_inner_x/2, 0, -sz/2+arm_low_z+board_thick/2]) {
        #prim_round_xplate(lid_outer_x+WELDING*2, sy, 2, 0.2, fnm);
    }
        
}
